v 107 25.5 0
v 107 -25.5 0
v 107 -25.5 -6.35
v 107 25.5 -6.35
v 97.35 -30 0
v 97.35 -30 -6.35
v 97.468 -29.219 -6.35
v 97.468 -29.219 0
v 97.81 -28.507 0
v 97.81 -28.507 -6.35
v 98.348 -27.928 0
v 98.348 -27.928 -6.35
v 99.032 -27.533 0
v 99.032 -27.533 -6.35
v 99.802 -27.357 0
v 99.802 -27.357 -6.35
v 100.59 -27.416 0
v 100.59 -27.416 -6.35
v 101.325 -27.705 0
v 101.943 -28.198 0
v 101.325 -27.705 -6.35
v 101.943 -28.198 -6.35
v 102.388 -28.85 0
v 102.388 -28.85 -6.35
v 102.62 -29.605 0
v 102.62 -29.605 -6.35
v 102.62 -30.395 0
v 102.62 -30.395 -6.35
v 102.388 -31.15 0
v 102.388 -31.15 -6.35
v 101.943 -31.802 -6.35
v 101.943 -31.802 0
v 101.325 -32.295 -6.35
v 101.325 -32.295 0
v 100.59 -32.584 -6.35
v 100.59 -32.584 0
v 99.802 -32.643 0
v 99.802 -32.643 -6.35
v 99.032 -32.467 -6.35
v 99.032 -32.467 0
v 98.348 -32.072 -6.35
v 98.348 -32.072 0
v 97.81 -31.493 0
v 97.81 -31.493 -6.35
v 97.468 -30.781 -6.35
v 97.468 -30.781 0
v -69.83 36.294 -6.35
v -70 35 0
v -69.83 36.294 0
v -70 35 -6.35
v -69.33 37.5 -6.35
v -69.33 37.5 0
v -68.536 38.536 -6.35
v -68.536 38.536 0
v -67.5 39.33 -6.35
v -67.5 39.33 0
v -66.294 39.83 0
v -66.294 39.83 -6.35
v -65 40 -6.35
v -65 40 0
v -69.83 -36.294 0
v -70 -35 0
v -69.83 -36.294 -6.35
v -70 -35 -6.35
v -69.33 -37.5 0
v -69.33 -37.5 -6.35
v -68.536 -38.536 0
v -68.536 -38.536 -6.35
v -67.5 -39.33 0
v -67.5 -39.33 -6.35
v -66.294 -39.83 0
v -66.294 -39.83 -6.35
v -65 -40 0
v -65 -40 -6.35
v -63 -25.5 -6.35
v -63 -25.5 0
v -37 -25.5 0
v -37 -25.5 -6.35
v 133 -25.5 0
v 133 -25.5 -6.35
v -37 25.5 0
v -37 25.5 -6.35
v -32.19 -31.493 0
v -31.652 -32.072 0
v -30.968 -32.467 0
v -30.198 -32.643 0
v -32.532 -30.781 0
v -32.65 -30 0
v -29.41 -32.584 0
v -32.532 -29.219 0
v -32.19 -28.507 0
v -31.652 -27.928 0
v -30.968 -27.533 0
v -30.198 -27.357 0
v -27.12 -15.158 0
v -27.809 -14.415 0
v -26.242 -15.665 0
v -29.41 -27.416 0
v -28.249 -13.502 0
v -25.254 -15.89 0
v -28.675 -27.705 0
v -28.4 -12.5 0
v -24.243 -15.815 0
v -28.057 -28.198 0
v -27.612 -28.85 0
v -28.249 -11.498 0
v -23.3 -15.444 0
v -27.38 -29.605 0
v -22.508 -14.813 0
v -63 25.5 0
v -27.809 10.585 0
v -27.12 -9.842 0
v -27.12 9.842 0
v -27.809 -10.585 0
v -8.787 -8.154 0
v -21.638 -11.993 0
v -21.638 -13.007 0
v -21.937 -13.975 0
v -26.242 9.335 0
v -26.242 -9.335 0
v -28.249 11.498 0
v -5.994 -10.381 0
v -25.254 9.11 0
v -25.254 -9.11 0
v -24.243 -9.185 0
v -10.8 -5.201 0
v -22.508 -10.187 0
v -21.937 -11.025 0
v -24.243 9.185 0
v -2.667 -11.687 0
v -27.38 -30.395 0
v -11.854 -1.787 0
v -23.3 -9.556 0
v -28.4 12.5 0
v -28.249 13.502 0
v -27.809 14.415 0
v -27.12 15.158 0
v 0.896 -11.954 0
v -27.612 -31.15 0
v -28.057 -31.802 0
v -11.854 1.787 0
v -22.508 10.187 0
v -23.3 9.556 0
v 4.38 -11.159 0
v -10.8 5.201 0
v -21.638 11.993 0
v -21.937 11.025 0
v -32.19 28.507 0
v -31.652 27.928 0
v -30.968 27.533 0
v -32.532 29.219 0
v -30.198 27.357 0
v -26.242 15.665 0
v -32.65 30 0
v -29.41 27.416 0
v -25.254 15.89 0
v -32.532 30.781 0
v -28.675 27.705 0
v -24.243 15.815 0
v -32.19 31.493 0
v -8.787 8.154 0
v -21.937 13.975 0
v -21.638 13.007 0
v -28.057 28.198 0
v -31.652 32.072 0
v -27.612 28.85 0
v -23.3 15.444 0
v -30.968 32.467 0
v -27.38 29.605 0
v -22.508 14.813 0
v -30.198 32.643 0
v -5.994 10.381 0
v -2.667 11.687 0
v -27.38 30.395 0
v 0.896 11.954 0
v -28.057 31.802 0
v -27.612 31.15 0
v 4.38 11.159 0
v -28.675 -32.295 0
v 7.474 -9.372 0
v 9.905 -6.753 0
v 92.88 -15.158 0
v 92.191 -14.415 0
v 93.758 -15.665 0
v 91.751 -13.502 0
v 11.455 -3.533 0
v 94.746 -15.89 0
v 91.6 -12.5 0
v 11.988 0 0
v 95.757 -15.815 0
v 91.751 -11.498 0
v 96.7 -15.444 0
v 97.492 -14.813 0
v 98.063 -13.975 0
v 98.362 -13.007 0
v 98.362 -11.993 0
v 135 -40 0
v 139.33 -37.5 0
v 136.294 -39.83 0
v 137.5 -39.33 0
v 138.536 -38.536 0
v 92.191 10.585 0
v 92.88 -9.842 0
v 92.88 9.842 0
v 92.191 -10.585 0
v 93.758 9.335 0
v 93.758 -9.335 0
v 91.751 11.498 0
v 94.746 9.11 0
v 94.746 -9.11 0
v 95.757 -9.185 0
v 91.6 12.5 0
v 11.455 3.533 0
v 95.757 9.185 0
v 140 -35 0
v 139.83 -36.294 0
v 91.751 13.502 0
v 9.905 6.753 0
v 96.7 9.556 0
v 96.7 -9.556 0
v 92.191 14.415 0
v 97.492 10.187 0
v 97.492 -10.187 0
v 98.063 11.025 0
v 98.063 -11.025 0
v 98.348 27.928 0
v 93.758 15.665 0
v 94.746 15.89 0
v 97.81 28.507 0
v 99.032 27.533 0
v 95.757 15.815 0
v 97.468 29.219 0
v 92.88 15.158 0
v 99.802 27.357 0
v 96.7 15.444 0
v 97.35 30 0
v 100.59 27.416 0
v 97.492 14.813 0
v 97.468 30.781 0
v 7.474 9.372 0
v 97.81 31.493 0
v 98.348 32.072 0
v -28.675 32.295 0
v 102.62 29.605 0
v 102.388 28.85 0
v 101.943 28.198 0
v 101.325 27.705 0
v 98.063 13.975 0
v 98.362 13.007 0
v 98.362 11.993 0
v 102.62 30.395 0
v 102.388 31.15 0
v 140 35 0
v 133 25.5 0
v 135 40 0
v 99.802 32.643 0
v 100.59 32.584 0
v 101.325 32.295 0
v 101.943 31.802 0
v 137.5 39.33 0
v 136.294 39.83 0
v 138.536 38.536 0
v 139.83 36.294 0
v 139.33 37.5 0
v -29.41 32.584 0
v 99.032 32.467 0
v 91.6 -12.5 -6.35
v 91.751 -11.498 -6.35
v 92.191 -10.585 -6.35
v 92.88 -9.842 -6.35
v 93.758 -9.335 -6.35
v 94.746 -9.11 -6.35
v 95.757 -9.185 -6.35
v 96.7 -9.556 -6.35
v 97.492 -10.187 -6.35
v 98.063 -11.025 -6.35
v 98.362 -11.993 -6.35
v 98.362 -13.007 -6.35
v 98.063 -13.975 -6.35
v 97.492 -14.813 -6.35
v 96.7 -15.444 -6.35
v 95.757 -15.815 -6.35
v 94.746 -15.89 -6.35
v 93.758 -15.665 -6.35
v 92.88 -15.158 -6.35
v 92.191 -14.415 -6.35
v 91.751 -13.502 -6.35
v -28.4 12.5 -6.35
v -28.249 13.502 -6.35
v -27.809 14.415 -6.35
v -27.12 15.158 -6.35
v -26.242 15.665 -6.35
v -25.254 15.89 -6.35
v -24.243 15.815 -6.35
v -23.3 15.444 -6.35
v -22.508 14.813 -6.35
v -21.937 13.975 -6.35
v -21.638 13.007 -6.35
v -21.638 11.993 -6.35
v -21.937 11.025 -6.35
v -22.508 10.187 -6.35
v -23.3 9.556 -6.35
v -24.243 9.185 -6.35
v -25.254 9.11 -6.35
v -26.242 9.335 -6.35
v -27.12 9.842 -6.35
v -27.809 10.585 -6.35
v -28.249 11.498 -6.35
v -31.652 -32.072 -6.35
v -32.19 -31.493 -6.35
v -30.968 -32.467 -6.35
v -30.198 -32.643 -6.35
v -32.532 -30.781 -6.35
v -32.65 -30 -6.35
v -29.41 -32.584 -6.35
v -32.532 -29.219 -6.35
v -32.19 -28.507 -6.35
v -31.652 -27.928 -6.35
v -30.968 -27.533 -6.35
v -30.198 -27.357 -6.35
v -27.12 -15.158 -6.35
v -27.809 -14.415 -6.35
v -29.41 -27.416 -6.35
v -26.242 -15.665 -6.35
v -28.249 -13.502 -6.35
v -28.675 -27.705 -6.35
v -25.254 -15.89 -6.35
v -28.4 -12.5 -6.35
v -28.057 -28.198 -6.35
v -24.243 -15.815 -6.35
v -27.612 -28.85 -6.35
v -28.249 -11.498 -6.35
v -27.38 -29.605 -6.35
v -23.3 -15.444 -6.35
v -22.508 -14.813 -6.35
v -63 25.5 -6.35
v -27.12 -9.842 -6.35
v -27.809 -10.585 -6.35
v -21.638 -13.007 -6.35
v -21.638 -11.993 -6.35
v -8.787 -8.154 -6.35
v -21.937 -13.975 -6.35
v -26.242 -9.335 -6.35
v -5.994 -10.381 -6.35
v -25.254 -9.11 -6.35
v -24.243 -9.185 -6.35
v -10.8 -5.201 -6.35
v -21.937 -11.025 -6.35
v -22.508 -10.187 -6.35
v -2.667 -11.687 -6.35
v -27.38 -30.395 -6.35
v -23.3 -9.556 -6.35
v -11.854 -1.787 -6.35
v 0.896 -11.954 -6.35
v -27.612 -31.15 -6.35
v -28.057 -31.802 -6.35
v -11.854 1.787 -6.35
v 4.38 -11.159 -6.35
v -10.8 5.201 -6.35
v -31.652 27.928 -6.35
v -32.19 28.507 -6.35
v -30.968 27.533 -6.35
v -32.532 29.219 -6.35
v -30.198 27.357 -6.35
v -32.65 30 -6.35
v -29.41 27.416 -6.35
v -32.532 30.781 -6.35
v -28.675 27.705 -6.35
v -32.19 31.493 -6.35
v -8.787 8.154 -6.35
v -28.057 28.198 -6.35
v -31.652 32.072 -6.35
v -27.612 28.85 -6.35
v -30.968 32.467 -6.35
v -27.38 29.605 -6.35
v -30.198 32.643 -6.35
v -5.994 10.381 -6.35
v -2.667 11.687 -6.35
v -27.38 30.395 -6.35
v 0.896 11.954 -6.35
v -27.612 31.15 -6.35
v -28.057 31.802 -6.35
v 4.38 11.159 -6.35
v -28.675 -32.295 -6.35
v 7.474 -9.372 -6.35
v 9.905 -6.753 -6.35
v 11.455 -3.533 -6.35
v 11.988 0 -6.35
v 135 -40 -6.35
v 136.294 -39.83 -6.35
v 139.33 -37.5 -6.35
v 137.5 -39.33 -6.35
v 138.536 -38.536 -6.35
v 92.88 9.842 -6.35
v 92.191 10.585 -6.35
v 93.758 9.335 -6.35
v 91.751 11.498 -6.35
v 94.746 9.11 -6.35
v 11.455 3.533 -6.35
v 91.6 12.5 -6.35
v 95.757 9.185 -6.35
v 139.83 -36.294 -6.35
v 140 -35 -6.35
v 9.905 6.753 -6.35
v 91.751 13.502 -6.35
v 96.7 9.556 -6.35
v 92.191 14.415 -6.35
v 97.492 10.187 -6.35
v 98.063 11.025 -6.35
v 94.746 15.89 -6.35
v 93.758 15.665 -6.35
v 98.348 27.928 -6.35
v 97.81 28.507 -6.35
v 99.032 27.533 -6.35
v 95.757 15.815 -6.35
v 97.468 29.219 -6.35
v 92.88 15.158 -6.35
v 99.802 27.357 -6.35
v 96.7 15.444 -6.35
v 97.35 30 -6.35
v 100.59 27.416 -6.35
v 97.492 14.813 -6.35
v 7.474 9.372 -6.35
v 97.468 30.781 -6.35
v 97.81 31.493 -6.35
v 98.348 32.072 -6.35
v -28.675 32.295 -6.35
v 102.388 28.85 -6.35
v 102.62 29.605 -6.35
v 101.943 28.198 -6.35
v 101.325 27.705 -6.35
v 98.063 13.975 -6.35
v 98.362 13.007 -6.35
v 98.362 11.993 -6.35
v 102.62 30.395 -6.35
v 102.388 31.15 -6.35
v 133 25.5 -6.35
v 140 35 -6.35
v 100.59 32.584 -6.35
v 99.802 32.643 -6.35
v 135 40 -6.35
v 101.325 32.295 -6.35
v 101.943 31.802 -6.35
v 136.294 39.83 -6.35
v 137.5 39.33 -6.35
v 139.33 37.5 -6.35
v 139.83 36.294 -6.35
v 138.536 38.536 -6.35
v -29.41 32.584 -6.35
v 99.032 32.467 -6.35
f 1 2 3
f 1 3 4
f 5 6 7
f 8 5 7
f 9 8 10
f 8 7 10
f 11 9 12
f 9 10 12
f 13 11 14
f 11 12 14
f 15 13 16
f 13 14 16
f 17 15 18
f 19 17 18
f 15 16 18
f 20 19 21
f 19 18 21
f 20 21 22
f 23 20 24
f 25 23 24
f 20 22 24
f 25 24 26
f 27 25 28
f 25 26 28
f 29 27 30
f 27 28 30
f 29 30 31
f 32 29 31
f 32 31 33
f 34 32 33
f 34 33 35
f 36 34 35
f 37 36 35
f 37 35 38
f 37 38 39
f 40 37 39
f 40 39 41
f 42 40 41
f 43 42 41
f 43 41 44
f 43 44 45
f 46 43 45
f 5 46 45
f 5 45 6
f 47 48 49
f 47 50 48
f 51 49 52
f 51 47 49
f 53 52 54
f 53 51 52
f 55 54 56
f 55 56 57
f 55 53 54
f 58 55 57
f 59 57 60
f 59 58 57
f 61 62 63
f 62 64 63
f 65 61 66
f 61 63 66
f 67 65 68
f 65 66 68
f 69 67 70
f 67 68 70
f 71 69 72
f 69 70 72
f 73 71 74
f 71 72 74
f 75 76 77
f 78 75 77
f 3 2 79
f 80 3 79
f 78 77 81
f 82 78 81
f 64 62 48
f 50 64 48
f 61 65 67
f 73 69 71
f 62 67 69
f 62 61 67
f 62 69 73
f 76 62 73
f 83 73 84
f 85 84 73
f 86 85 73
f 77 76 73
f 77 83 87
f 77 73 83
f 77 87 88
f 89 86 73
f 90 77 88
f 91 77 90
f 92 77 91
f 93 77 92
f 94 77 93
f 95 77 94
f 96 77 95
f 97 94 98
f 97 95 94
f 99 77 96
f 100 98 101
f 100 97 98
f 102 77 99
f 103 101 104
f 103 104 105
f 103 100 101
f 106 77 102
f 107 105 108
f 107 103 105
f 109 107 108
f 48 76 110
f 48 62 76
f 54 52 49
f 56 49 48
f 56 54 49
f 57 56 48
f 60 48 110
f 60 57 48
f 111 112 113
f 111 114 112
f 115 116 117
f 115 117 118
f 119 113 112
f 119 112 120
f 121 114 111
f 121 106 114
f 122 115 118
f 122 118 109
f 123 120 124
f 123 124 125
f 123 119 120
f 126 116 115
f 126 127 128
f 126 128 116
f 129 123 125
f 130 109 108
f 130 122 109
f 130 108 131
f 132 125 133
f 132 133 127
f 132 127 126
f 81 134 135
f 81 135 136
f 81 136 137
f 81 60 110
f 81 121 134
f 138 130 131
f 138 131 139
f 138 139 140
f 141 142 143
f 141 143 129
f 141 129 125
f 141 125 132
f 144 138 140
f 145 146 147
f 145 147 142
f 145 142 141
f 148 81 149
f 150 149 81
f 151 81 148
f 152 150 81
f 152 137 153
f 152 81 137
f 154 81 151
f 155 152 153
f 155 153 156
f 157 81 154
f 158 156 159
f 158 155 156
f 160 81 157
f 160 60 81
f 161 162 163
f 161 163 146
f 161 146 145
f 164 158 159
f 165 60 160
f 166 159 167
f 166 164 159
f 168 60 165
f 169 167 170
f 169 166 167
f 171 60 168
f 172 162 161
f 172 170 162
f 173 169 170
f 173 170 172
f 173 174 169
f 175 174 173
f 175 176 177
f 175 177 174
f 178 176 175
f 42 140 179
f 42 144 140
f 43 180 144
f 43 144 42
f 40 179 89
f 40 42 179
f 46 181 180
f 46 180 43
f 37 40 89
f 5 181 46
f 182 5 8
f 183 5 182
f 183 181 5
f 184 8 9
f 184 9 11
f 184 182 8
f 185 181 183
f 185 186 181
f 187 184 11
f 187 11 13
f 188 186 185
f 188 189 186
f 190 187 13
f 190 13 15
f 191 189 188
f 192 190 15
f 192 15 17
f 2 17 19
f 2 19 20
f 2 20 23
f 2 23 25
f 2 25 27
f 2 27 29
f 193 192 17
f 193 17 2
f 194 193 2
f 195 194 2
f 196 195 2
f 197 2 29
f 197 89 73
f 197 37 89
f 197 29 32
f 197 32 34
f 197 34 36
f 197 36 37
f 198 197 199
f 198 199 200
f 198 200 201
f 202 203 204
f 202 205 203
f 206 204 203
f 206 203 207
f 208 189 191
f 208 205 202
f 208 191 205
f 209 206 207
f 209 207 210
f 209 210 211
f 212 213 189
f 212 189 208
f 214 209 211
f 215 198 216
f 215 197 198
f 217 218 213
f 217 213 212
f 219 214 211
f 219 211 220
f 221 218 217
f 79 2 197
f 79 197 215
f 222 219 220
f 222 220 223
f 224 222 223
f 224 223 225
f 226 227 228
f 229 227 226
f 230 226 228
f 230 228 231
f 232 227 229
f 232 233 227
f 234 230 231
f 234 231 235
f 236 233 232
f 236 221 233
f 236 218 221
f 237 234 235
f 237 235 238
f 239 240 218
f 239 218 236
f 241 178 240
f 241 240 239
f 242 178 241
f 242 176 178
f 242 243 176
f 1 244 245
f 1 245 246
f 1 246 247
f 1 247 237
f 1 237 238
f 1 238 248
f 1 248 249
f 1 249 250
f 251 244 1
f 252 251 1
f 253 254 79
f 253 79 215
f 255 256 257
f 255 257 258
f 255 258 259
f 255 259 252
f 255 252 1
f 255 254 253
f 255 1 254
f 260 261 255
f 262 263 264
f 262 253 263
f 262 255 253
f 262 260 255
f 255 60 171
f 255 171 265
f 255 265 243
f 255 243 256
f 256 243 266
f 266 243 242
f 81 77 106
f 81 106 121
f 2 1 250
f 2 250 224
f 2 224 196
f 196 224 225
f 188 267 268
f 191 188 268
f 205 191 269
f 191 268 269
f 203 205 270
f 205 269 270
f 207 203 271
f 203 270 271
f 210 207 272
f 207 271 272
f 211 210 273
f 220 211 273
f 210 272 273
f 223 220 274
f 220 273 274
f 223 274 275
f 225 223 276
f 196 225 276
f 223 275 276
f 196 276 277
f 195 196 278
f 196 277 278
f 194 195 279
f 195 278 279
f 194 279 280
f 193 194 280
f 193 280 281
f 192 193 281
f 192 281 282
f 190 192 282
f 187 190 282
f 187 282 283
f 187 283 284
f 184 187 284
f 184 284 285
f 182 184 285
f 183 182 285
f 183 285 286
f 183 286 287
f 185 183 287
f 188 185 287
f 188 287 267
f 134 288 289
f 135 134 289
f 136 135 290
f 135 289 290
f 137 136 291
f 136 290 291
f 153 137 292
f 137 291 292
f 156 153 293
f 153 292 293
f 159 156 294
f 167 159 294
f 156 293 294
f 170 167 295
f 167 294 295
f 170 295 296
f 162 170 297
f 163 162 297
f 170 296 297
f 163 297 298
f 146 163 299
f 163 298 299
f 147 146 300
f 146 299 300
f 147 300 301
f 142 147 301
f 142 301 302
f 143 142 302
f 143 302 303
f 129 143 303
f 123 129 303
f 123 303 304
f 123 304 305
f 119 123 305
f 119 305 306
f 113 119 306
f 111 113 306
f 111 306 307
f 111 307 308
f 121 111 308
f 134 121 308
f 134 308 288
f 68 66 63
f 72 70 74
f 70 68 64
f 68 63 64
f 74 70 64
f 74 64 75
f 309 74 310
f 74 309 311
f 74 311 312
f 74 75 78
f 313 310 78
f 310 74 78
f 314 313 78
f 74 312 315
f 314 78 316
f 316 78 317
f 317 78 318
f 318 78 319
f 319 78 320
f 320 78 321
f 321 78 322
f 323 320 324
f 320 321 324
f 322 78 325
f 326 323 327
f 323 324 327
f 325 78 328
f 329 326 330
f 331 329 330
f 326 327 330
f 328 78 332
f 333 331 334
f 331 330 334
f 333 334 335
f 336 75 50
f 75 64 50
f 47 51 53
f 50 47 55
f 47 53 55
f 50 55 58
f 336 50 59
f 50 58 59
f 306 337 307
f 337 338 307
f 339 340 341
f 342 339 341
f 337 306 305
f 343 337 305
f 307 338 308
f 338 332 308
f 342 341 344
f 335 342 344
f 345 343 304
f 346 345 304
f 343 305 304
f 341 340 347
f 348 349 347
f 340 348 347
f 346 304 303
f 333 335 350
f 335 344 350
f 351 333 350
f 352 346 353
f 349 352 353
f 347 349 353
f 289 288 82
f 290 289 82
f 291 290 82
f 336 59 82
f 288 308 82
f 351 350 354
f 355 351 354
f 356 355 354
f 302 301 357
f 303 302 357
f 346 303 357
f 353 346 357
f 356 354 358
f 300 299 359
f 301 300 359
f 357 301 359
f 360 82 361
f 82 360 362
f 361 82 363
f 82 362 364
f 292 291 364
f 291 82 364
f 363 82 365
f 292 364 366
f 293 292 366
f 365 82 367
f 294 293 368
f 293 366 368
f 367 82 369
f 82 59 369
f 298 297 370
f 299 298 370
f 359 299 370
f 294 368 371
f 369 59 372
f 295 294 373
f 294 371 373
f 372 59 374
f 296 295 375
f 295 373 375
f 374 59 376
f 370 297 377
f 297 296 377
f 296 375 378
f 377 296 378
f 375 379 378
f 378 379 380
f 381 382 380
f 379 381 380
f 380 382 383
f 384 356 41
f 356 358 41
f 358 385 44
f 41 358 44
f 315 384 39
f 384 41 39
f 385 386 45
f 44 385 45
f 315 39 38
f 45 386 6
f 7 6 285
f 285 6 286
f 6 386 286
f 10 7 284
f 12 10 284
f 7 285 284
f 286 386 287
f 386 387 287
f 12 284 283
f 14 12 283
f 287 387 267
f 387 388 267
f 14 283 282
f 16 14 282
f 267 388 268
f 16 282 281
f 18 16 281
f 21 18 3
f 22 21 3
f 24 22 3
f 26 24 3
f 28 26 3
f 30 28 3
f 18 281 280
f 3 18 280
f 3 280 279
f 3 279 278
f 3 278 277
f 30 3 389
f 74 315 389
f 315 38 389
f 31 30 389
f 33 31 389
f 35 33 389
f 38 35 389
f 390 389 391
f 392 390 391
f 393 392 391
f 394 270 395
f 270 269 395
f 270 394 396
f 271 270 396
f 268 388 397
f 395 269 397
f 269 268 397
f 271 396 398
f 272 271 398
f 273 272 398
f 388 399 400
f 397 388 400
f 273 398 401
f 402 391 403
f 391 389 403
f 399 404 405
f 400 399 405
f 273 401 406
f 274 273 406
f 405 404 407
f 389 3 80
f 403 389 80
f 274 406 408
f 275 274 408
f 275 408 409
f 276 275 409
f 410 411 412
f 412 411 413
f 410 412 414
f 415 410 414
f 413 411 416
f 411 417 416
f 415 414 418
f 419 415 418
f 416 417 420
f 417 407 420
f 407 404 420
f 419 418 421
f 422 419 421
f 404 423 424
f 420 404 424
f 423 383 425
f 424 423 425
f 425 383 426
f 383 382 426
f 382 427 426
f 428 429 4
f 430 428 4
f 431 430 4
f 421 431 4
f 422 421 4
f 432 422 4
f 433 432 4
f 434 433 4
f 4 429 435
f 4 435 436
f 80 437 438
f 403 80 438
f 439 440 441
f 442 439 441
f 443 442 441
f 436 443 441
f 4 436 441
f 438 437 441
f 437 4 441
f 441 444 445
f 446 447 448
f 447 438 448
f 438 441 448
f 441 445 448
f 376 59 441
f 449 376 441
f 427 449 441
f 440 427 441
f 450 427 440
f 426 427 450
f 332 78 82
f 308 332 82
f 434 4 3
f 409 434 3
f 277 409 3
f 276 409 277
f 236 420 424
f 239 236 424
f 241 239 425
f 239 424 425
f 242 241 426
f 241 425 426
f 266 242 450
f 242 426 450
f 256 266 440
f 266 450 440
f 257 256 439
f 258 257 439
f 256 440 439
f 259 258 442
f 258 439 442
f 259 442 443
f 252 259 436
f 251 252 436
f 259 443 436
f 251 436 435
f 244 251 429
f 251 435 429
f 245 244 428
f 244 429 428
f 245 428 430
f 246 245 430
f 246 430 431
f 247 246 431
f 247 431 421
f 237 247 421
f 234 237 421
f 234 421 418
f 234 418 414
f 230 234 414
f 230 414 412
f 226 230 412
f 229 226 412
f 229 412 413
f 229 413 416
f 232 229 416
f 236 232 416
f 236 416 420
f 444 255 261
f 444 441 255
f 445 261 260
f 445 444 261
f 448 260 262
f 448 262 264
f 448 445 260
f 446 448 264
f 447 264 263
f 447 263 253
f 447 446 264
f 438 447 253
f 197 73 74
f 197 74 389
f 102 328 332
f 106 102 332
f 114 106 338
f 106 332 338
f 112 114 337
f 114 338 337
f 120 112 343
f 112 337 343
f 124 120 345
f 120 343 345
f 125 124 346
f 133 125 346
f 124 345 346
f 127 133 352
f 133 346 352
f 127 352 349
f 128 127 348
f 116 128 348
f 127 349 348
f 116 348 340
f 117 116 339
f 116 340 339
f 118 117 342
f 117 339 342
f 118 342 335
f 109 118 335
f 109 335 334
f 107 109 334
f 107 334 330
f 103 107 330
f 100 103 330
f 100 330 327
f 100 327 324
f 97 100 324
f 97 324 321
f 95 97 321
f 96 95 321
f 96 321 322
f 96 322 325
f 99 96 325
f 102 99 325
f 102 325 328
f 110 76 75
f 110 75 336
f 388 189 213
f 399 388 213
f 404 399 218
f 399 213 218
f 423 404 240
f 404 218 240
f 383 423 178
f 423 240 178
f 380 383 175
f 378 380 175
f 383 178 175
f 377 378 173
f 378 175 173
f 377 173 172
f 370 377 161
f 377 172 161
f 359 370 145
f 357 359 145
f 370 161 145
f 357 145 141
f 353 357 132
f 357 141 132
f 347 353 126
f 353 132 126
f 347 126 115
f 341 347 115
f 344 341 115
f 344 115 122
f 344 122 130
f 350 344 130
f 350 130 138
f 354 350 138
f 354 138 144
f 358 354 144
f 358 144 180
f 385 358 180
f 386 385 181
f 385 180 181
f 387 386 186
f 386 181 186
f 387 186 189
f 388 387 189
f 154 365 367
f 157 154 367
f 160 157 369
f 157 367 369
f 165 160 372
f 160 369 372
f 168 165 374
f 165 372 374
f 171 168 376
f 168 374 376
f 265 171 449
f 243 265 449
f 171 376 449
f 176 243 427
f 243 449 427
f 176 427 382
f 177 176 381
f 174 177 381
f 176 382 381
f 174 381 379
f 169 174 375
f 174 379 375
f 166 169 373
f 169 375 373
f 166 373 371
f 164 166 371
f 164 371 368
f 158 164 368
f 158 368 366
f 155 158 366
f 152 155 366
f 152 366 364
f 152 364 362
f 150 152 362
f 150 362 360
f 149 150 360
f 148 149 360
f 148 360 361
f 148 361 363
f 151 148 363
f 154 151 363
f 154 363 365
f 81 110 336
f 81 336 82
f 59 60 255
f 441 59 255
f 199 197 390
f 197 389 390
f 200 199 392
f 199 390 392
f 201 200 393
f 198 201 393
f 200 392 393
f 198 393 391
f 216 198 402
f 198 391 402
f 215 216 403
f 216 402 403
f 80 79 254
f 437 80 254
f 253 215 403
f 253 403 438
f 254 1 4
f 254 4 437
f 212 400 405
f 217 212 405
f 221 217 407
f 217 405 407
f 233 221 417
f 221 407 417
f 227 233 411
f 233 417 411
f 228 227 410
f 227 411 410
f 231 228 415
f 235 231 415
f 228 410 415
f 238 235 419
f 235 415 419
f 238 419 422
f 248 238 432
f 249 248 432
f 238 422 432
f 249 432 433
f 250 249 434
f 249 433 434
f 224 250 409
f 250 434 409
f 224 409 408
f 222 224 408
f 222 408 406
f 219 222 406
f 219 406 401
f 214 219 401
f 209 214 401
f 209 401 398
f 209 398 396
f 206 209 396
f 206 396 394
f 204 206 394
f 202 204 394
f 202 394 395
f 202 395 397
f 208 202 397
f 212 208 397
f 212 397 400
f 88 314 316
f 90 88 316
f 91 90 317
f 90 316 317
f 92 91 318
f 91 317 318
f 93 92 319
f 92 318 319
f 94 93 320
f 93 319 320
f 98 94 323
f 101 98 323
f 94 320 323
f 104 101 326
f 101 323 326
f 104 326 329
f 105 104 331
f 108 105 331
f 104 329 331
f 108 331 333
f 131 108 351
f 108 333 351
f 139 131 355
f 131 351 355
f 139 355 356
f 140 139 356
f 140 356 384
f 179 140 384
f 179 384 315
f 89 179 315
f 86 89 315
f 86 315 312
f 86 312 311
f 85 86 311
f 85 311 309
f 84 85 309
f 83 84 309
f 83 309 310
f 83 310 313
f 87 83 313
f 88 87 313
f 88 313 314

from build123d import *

# Parameters (mm, degrees)
SKETCH1_W                    = 210
SKETCH1_H                    = 80
SKETCH1_R                    = 11.9875
SKETCH1_W_2                  = 26
SKETCH1_H_2                  = 51
BOSS_EXTRUDE1_DEPTH          = 6.35
M5_CLEARANCE_HOLE1_D         = 5.3
FILLET1_R                    = 5
TAP_DRILL_FOR_M8X1_25_TAP1_D = 6.8


with BuildPart() as part:
    # Sketch1 → Boss-Extrude1 (new body)
    with BuildSketch(Plane.XY):
        with Locations((35, 0)):
            Rectangle(SKETCH1_W, SKETCH1_H)
        Circle(SKETCH1_R, mode=Mode.SUBTRACT)
        with Locations((-50, 0)):
            Rectangle(SKETCH1_W_2, SKETCH1_H_2, mode=Mode.SUBTRACT)
        with Locations((120, 0)):
            Rectangle(SKETCH1_W_2, SKETCH1_H_2, mode=Mode.SUBTRACT)
    extrude(amount=-BOSS_EXTRUDE1_DEPTH)

    # M5 Clearance Hole1 (through all)
    with Locations(Plane(origin=(-30, 30, 0), x_dir=(1, 0, 0), z_dir=(0, 0, 1))):
        with Locations((0, 0), (0, -60), (130, -60), (130, 0)):
            Hole(M5_CLEARANCE_HOLE1_D / 2)

    # Fillet1
    fillet1_edges = [part.edges().sort_by_distance(p)[0] for p in [
        (-70, 40, -3.175),
        (140, 40, -3.175),
        (140, -40, -3.175),
        (-70, -40, -3.175),
    ]]
    fillet(fillet1_edges, radius=FILLET1_R)

    # Tap Drill for M8x1.25 Tap1 (through all)
    with Locations(Plane(origin=(-25, 12.5, 0), x_dir=(1, 0, 0), z_dir=(0, 0, 1))):
        with Locations((0, 0), (0, -25), (120, 0), (120, -25)):
            Hole(TAP_DRILL_FOR_M8X1_25_TAP1_D / 2)


solid = part.part
